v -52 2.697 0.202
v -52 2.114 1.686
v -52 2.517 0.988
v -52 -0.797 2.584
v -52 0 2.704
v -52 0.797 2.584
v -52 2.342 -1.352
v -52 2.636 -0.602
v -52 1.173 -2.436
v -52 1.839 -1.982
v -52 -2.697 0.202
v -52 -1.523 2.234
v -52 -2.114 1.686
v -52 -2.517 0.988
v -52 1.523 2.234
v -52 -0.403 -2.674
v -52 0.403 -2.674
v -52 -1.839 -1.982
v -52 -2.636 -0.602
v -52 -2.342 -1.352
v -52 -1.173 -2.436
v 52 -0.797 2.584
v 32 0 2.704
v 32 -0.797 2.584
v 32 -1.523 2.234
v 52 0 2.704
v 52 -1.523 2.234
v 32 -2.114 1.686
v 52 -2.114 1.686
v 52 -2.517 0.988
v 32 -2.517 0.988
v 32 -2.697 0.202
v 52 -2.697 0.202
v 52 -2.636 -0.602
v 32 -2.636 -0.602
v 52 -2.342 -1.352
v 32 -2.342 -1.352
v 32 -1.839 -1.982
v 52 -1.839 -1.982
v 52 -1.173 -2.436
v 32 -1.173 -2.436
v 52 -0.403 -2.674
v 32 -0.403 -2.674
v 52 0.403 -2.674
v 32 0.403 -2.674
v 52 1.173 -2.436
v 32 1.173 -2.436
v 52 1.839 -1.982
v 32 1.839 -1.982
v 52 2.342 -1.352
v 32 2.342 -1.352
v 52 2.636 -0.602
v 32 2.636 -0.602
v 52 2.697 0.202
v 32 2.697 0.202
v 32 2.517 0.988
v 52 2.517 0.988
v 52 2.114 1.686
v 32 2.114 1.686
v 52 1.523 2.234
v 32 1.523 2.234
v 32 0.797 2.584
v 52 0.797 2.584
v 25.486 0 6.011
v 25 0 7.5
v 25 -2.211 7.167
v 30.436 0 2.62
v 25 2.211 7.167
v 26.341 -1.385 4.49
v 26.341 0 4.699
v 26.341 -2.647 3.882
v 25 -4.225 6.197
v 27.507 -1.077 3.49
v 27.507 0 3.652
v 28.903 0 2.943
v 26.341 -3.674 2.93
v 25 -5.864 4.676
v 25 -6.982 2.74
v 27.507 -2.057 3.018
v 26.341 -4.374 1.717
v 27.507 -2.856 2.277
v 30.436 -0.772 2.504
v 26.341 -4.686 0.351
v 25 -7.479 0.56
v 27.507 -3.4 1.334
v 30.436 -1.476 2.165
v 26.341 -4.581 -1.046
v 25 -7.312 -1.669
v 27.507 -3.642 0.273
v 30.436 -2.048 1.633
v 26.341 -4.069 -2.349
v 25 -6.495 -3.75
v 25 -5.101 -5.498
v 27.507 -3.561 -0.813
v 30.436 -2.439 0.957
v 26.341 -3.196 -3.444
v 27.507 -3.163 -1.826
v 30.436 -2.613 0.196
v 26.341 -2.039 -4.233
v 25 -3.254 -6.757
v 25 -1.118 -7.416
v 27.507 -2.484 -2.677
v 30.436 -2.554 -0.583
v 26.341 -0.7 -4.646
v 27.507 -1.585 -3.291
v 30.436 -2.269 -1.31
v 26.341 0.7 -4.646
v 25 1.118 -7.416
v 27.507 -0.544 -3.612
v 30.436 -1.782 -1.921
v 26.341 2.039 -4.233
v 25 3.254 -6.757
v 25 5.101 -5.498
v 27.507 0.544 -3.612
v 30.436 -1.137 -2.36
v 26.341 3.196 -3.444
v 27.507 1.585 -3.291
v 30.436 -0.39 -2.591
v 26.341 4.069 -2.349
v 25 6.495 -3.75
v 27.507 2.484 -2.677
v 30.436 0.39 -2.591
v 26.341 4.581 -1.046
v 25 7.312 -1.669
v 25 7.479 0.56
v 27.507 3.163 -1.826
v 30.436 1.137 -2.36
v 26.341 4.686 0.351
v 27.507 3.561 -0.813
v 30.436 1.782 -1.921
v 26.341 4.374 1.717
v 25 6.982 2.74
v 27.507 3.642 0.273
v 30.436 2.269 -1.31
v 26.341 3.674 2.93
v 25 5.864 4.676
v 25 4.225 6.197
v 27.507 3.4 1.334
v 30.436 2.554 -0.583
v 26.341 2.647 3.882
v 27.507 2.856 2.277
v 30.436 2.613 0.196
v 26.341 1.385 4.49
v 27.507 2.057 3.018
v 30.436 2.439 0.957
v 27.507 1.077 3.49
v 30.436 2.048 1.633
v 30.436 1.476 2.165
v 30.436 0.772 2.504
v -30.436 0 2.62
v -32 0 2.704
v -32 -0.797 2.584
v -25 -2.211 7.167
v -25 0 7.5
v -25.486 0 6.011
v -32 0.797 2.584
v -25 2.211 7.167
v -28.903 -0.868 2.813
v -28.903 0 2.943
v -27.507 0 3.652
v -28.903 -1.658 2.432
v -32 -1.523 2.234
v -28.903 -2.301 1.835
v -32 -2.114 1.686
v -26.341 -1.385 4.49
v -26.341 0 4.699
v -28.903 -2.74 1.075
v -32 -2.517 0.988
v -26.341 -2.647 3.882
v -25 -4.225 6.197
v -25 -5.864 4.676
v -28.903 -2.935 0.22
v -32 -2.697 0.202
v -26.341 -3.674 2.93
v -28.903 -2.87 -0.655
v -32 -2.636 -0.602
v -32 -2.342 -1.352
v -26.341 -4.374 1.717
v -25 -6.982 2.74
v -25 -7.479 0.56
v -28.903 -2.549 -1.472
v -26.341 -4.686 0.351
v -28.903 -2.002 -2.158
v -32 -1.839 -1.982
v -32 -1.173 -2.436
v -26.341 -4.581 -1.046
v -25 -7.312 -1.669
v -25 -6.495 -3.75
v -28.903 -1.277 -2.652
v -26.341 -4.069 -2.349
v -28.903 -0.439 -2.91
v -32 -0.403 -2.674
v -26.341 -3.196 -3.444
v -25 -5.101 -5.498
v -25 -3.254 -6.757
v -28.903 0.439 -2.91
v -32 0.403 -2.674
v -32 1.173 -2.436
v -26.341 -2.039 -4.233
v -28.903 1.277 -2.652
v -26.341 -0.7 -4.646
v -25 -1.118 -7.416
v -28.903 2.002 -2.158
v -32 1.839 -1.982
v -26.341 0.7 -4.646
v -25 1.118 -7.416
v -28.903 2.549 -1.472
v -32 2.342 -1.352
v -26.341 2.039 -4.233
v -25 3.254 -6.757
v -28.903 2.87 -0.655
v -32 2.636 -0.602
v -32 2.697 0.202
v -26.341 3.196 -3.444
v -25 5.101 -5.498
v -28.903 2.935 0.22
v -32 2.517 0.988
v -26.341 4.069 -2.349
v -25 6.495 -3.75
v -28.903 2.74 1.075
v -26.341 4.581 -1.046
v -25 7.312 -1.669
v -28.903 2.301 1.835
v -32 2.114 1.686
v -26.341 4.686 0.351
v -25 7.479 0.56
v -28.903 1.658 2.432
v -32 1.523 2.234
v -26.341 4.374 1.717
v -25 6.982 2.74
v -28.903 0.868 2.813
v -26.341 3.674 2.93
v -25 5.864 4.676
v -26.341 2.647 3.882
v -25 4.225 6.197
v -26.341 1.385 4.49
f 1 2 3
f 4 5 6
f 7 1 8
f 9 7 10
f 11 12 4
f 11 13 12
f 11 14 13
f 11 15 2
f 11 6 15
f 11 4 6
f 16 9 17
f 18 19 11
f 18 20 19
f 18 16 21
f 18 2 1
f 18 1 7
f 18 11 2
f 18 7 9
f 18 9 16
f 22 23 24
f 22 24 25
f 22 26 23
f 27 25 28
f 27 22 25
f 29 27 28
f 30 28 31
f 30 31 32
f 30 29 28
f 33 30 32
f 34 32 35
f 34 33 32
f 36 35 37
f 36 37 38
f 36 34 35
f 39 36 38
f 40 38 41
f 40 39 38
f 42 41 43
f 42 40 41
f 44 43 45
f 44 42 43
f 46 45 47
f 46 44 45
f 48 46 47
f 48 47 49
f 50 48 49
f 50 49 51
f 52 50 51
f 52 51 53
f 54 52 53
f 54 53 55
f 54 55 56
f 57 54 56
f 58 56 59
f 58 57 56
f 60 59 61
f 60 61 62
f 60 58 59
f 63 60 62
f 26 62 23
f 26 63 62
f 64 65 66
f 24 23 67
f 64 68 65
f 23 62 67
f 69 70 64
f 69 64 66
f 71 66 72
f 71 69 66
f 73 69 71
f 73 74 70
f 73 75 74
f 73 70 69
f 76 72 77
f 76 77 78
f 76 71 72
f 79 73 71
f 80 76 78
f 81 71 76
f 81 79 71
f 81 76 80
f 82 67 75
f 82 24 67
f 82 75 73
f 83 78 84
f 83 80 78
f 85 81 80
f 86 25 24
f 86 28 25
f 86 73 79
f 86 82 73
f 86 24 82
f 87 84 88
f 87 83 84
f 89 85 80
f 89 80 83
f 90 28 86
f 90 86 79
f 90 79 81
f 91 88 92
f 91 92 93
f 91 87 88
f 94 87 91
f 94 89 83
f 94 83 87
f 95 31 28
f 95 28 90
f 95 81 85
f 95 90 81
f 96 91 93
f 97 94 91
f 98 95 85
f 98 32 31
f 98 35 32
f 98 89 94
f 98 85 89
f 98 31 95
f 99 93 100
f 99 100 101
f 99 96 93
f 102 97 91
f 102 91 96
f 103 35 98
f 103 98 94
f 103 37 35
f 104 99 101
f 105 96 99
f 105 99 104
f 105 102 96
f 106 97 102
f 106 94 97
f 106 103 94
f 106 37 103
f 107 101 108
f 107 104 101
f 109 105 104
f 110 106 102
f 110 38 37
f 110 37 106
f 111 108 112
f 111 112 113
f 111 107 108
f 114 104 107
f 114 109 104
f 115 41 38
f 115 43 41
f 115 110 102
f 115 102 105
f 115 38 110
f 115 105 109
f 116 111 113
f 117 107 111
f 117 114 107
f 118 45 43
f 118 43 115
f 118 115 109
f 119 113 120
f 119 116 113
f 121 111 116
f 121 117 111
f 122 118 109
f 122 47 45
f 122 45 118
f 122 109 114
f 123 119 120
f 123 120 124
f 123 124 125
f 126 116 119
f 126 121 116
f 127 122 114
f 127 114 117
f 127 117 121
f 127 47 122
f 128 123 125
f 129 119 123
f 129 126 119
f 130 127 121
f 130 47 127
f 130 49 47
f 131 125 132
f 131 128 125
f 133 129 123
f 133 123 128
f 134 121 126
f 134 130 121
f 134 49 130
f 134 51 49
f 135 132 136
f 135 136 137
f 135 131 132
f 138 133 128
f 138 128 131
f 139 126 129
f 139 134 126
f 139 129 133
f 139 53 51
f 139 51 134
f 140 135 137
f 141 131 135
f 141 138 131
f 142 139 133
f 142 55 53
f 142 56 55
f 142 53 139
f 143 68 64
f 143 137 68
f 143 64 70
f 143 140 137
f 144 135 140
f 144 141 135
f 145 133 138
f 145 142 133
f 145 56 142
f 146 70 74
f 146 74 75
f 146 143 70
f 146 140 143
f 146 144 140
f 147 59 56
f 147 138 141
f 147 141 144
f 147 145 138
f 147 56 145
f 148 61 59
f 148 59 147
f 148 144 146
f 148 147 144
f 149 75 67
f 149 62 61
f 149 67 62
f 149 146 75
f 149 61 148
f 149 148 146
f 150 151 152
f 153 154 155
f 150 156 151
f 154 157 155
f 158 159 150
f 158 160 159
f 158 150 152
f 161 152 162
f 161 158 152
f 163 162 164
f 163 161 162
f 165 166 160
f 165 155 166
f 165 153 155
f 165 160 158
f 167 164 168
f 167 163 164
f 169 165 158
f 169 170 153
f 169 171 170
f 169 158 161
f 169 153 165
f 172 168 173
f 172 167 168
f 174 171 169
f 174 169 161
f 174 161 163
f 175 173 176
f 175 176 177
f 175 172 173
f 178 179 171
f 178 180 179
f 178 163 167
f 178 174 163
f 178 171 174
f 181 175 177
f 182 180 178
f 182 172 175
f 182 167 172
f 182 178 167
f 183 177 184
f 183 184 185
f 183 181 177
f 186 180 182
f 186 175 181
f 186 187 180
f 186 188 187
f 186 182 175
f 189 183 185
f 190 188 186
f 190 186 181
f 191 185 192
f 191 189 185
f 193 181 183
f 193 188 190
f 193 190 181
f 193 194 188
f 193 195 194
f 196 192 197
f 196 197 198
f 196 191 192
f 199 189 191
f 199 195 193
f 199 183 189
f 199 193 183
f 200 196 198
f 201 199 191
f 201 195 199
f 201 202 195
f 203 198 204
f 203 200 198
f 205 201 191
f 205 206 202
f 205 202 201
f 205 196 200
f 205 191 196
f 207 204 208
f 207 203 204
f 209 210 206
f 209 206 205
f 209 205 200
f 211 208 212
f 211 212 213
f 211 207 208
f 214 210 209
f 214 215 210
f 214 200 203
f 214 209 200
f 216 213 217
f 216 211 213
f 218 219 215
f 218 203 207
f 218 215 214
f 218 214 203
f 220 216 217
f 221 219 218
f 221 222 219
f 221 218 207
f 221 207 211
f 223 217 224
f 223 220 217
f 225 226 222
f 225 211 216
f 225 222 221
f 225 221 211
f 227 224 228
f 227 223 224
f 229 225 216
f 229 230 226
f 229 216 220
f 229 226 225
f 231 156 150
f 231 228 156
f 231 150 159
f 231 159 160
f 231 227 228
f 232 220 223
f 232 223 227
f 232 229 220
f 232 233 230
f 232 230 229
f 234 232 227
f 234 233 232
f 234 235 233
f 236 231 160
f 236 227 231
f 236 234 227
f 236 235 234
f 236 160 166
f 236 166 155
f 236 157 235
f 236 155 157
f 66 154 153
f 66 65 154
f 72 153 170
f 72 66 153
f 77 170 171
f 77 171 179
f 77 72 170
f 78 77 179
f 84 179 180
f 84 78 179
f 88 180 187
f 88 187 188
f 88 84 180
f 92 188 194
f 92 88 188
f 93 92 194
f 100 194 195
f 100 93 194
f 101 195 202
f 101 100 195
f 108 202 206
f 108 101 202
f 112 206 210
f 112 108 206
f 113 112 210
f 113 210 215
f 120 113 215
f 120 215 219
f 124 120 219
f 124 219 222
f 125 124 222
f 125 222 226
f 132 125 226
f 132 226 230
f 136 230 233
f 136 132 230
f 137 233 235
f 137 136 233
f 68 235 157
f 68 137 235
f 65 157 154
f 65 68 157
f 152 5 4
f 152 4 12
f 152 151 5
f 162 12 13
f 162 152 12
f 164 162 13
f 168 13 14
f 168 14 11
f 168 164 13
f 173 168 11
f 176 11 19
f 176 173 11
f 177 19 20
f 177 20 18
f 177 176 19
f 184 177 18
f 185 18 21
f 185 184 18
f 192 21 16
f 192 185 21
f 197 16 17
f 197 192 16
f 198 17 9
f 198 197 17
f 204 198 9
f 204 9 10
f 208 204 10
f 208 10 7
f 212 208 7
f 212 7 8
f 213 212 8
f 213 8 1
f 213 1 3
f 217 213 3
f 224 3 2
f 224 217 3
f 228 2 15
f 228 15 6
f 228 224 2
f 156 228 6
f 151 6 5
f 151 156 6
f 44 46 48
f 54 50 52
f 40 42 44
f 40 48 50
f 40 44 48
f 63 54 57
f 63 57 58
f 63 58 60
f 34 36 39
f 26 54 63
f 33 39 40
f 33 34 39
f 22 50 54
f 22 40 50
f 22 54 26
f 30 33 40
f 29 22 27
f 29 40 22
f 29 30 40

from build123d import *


with BuildPart() as part:
    # Esboço1 → Revolução1 (revolve)
    with BuildSketch(Plane(origin=(0, 0, 0), x_dir=(1, 0, 0), z_dir=(0, 1, 0))):
        with BuildLine():
            Line((-25, -7.5), (25, -7.5))
            ThreePointArc((25, -7.5), (27.50675077, -3.65233677), (32, -2.704168477))
            Line((32, -2.704168477), (52, -2.704168477))
            Line((52, -2.704168477), (52, 0))
            Line((52, 0), (-52, 0))
            Line((-52, 0), (-52, -2.704168477))
            Line((-52, -2.704168477), (-32, -2.704168477))
            ThreePointArc((-32, -2.704168477), (-27.50675077, -3.65233677), (-25, -7.5))
        make_face()
    revolve(axis=Axis((-4.5, 0, 0), (1, 0, 0)))


solid = part.part
